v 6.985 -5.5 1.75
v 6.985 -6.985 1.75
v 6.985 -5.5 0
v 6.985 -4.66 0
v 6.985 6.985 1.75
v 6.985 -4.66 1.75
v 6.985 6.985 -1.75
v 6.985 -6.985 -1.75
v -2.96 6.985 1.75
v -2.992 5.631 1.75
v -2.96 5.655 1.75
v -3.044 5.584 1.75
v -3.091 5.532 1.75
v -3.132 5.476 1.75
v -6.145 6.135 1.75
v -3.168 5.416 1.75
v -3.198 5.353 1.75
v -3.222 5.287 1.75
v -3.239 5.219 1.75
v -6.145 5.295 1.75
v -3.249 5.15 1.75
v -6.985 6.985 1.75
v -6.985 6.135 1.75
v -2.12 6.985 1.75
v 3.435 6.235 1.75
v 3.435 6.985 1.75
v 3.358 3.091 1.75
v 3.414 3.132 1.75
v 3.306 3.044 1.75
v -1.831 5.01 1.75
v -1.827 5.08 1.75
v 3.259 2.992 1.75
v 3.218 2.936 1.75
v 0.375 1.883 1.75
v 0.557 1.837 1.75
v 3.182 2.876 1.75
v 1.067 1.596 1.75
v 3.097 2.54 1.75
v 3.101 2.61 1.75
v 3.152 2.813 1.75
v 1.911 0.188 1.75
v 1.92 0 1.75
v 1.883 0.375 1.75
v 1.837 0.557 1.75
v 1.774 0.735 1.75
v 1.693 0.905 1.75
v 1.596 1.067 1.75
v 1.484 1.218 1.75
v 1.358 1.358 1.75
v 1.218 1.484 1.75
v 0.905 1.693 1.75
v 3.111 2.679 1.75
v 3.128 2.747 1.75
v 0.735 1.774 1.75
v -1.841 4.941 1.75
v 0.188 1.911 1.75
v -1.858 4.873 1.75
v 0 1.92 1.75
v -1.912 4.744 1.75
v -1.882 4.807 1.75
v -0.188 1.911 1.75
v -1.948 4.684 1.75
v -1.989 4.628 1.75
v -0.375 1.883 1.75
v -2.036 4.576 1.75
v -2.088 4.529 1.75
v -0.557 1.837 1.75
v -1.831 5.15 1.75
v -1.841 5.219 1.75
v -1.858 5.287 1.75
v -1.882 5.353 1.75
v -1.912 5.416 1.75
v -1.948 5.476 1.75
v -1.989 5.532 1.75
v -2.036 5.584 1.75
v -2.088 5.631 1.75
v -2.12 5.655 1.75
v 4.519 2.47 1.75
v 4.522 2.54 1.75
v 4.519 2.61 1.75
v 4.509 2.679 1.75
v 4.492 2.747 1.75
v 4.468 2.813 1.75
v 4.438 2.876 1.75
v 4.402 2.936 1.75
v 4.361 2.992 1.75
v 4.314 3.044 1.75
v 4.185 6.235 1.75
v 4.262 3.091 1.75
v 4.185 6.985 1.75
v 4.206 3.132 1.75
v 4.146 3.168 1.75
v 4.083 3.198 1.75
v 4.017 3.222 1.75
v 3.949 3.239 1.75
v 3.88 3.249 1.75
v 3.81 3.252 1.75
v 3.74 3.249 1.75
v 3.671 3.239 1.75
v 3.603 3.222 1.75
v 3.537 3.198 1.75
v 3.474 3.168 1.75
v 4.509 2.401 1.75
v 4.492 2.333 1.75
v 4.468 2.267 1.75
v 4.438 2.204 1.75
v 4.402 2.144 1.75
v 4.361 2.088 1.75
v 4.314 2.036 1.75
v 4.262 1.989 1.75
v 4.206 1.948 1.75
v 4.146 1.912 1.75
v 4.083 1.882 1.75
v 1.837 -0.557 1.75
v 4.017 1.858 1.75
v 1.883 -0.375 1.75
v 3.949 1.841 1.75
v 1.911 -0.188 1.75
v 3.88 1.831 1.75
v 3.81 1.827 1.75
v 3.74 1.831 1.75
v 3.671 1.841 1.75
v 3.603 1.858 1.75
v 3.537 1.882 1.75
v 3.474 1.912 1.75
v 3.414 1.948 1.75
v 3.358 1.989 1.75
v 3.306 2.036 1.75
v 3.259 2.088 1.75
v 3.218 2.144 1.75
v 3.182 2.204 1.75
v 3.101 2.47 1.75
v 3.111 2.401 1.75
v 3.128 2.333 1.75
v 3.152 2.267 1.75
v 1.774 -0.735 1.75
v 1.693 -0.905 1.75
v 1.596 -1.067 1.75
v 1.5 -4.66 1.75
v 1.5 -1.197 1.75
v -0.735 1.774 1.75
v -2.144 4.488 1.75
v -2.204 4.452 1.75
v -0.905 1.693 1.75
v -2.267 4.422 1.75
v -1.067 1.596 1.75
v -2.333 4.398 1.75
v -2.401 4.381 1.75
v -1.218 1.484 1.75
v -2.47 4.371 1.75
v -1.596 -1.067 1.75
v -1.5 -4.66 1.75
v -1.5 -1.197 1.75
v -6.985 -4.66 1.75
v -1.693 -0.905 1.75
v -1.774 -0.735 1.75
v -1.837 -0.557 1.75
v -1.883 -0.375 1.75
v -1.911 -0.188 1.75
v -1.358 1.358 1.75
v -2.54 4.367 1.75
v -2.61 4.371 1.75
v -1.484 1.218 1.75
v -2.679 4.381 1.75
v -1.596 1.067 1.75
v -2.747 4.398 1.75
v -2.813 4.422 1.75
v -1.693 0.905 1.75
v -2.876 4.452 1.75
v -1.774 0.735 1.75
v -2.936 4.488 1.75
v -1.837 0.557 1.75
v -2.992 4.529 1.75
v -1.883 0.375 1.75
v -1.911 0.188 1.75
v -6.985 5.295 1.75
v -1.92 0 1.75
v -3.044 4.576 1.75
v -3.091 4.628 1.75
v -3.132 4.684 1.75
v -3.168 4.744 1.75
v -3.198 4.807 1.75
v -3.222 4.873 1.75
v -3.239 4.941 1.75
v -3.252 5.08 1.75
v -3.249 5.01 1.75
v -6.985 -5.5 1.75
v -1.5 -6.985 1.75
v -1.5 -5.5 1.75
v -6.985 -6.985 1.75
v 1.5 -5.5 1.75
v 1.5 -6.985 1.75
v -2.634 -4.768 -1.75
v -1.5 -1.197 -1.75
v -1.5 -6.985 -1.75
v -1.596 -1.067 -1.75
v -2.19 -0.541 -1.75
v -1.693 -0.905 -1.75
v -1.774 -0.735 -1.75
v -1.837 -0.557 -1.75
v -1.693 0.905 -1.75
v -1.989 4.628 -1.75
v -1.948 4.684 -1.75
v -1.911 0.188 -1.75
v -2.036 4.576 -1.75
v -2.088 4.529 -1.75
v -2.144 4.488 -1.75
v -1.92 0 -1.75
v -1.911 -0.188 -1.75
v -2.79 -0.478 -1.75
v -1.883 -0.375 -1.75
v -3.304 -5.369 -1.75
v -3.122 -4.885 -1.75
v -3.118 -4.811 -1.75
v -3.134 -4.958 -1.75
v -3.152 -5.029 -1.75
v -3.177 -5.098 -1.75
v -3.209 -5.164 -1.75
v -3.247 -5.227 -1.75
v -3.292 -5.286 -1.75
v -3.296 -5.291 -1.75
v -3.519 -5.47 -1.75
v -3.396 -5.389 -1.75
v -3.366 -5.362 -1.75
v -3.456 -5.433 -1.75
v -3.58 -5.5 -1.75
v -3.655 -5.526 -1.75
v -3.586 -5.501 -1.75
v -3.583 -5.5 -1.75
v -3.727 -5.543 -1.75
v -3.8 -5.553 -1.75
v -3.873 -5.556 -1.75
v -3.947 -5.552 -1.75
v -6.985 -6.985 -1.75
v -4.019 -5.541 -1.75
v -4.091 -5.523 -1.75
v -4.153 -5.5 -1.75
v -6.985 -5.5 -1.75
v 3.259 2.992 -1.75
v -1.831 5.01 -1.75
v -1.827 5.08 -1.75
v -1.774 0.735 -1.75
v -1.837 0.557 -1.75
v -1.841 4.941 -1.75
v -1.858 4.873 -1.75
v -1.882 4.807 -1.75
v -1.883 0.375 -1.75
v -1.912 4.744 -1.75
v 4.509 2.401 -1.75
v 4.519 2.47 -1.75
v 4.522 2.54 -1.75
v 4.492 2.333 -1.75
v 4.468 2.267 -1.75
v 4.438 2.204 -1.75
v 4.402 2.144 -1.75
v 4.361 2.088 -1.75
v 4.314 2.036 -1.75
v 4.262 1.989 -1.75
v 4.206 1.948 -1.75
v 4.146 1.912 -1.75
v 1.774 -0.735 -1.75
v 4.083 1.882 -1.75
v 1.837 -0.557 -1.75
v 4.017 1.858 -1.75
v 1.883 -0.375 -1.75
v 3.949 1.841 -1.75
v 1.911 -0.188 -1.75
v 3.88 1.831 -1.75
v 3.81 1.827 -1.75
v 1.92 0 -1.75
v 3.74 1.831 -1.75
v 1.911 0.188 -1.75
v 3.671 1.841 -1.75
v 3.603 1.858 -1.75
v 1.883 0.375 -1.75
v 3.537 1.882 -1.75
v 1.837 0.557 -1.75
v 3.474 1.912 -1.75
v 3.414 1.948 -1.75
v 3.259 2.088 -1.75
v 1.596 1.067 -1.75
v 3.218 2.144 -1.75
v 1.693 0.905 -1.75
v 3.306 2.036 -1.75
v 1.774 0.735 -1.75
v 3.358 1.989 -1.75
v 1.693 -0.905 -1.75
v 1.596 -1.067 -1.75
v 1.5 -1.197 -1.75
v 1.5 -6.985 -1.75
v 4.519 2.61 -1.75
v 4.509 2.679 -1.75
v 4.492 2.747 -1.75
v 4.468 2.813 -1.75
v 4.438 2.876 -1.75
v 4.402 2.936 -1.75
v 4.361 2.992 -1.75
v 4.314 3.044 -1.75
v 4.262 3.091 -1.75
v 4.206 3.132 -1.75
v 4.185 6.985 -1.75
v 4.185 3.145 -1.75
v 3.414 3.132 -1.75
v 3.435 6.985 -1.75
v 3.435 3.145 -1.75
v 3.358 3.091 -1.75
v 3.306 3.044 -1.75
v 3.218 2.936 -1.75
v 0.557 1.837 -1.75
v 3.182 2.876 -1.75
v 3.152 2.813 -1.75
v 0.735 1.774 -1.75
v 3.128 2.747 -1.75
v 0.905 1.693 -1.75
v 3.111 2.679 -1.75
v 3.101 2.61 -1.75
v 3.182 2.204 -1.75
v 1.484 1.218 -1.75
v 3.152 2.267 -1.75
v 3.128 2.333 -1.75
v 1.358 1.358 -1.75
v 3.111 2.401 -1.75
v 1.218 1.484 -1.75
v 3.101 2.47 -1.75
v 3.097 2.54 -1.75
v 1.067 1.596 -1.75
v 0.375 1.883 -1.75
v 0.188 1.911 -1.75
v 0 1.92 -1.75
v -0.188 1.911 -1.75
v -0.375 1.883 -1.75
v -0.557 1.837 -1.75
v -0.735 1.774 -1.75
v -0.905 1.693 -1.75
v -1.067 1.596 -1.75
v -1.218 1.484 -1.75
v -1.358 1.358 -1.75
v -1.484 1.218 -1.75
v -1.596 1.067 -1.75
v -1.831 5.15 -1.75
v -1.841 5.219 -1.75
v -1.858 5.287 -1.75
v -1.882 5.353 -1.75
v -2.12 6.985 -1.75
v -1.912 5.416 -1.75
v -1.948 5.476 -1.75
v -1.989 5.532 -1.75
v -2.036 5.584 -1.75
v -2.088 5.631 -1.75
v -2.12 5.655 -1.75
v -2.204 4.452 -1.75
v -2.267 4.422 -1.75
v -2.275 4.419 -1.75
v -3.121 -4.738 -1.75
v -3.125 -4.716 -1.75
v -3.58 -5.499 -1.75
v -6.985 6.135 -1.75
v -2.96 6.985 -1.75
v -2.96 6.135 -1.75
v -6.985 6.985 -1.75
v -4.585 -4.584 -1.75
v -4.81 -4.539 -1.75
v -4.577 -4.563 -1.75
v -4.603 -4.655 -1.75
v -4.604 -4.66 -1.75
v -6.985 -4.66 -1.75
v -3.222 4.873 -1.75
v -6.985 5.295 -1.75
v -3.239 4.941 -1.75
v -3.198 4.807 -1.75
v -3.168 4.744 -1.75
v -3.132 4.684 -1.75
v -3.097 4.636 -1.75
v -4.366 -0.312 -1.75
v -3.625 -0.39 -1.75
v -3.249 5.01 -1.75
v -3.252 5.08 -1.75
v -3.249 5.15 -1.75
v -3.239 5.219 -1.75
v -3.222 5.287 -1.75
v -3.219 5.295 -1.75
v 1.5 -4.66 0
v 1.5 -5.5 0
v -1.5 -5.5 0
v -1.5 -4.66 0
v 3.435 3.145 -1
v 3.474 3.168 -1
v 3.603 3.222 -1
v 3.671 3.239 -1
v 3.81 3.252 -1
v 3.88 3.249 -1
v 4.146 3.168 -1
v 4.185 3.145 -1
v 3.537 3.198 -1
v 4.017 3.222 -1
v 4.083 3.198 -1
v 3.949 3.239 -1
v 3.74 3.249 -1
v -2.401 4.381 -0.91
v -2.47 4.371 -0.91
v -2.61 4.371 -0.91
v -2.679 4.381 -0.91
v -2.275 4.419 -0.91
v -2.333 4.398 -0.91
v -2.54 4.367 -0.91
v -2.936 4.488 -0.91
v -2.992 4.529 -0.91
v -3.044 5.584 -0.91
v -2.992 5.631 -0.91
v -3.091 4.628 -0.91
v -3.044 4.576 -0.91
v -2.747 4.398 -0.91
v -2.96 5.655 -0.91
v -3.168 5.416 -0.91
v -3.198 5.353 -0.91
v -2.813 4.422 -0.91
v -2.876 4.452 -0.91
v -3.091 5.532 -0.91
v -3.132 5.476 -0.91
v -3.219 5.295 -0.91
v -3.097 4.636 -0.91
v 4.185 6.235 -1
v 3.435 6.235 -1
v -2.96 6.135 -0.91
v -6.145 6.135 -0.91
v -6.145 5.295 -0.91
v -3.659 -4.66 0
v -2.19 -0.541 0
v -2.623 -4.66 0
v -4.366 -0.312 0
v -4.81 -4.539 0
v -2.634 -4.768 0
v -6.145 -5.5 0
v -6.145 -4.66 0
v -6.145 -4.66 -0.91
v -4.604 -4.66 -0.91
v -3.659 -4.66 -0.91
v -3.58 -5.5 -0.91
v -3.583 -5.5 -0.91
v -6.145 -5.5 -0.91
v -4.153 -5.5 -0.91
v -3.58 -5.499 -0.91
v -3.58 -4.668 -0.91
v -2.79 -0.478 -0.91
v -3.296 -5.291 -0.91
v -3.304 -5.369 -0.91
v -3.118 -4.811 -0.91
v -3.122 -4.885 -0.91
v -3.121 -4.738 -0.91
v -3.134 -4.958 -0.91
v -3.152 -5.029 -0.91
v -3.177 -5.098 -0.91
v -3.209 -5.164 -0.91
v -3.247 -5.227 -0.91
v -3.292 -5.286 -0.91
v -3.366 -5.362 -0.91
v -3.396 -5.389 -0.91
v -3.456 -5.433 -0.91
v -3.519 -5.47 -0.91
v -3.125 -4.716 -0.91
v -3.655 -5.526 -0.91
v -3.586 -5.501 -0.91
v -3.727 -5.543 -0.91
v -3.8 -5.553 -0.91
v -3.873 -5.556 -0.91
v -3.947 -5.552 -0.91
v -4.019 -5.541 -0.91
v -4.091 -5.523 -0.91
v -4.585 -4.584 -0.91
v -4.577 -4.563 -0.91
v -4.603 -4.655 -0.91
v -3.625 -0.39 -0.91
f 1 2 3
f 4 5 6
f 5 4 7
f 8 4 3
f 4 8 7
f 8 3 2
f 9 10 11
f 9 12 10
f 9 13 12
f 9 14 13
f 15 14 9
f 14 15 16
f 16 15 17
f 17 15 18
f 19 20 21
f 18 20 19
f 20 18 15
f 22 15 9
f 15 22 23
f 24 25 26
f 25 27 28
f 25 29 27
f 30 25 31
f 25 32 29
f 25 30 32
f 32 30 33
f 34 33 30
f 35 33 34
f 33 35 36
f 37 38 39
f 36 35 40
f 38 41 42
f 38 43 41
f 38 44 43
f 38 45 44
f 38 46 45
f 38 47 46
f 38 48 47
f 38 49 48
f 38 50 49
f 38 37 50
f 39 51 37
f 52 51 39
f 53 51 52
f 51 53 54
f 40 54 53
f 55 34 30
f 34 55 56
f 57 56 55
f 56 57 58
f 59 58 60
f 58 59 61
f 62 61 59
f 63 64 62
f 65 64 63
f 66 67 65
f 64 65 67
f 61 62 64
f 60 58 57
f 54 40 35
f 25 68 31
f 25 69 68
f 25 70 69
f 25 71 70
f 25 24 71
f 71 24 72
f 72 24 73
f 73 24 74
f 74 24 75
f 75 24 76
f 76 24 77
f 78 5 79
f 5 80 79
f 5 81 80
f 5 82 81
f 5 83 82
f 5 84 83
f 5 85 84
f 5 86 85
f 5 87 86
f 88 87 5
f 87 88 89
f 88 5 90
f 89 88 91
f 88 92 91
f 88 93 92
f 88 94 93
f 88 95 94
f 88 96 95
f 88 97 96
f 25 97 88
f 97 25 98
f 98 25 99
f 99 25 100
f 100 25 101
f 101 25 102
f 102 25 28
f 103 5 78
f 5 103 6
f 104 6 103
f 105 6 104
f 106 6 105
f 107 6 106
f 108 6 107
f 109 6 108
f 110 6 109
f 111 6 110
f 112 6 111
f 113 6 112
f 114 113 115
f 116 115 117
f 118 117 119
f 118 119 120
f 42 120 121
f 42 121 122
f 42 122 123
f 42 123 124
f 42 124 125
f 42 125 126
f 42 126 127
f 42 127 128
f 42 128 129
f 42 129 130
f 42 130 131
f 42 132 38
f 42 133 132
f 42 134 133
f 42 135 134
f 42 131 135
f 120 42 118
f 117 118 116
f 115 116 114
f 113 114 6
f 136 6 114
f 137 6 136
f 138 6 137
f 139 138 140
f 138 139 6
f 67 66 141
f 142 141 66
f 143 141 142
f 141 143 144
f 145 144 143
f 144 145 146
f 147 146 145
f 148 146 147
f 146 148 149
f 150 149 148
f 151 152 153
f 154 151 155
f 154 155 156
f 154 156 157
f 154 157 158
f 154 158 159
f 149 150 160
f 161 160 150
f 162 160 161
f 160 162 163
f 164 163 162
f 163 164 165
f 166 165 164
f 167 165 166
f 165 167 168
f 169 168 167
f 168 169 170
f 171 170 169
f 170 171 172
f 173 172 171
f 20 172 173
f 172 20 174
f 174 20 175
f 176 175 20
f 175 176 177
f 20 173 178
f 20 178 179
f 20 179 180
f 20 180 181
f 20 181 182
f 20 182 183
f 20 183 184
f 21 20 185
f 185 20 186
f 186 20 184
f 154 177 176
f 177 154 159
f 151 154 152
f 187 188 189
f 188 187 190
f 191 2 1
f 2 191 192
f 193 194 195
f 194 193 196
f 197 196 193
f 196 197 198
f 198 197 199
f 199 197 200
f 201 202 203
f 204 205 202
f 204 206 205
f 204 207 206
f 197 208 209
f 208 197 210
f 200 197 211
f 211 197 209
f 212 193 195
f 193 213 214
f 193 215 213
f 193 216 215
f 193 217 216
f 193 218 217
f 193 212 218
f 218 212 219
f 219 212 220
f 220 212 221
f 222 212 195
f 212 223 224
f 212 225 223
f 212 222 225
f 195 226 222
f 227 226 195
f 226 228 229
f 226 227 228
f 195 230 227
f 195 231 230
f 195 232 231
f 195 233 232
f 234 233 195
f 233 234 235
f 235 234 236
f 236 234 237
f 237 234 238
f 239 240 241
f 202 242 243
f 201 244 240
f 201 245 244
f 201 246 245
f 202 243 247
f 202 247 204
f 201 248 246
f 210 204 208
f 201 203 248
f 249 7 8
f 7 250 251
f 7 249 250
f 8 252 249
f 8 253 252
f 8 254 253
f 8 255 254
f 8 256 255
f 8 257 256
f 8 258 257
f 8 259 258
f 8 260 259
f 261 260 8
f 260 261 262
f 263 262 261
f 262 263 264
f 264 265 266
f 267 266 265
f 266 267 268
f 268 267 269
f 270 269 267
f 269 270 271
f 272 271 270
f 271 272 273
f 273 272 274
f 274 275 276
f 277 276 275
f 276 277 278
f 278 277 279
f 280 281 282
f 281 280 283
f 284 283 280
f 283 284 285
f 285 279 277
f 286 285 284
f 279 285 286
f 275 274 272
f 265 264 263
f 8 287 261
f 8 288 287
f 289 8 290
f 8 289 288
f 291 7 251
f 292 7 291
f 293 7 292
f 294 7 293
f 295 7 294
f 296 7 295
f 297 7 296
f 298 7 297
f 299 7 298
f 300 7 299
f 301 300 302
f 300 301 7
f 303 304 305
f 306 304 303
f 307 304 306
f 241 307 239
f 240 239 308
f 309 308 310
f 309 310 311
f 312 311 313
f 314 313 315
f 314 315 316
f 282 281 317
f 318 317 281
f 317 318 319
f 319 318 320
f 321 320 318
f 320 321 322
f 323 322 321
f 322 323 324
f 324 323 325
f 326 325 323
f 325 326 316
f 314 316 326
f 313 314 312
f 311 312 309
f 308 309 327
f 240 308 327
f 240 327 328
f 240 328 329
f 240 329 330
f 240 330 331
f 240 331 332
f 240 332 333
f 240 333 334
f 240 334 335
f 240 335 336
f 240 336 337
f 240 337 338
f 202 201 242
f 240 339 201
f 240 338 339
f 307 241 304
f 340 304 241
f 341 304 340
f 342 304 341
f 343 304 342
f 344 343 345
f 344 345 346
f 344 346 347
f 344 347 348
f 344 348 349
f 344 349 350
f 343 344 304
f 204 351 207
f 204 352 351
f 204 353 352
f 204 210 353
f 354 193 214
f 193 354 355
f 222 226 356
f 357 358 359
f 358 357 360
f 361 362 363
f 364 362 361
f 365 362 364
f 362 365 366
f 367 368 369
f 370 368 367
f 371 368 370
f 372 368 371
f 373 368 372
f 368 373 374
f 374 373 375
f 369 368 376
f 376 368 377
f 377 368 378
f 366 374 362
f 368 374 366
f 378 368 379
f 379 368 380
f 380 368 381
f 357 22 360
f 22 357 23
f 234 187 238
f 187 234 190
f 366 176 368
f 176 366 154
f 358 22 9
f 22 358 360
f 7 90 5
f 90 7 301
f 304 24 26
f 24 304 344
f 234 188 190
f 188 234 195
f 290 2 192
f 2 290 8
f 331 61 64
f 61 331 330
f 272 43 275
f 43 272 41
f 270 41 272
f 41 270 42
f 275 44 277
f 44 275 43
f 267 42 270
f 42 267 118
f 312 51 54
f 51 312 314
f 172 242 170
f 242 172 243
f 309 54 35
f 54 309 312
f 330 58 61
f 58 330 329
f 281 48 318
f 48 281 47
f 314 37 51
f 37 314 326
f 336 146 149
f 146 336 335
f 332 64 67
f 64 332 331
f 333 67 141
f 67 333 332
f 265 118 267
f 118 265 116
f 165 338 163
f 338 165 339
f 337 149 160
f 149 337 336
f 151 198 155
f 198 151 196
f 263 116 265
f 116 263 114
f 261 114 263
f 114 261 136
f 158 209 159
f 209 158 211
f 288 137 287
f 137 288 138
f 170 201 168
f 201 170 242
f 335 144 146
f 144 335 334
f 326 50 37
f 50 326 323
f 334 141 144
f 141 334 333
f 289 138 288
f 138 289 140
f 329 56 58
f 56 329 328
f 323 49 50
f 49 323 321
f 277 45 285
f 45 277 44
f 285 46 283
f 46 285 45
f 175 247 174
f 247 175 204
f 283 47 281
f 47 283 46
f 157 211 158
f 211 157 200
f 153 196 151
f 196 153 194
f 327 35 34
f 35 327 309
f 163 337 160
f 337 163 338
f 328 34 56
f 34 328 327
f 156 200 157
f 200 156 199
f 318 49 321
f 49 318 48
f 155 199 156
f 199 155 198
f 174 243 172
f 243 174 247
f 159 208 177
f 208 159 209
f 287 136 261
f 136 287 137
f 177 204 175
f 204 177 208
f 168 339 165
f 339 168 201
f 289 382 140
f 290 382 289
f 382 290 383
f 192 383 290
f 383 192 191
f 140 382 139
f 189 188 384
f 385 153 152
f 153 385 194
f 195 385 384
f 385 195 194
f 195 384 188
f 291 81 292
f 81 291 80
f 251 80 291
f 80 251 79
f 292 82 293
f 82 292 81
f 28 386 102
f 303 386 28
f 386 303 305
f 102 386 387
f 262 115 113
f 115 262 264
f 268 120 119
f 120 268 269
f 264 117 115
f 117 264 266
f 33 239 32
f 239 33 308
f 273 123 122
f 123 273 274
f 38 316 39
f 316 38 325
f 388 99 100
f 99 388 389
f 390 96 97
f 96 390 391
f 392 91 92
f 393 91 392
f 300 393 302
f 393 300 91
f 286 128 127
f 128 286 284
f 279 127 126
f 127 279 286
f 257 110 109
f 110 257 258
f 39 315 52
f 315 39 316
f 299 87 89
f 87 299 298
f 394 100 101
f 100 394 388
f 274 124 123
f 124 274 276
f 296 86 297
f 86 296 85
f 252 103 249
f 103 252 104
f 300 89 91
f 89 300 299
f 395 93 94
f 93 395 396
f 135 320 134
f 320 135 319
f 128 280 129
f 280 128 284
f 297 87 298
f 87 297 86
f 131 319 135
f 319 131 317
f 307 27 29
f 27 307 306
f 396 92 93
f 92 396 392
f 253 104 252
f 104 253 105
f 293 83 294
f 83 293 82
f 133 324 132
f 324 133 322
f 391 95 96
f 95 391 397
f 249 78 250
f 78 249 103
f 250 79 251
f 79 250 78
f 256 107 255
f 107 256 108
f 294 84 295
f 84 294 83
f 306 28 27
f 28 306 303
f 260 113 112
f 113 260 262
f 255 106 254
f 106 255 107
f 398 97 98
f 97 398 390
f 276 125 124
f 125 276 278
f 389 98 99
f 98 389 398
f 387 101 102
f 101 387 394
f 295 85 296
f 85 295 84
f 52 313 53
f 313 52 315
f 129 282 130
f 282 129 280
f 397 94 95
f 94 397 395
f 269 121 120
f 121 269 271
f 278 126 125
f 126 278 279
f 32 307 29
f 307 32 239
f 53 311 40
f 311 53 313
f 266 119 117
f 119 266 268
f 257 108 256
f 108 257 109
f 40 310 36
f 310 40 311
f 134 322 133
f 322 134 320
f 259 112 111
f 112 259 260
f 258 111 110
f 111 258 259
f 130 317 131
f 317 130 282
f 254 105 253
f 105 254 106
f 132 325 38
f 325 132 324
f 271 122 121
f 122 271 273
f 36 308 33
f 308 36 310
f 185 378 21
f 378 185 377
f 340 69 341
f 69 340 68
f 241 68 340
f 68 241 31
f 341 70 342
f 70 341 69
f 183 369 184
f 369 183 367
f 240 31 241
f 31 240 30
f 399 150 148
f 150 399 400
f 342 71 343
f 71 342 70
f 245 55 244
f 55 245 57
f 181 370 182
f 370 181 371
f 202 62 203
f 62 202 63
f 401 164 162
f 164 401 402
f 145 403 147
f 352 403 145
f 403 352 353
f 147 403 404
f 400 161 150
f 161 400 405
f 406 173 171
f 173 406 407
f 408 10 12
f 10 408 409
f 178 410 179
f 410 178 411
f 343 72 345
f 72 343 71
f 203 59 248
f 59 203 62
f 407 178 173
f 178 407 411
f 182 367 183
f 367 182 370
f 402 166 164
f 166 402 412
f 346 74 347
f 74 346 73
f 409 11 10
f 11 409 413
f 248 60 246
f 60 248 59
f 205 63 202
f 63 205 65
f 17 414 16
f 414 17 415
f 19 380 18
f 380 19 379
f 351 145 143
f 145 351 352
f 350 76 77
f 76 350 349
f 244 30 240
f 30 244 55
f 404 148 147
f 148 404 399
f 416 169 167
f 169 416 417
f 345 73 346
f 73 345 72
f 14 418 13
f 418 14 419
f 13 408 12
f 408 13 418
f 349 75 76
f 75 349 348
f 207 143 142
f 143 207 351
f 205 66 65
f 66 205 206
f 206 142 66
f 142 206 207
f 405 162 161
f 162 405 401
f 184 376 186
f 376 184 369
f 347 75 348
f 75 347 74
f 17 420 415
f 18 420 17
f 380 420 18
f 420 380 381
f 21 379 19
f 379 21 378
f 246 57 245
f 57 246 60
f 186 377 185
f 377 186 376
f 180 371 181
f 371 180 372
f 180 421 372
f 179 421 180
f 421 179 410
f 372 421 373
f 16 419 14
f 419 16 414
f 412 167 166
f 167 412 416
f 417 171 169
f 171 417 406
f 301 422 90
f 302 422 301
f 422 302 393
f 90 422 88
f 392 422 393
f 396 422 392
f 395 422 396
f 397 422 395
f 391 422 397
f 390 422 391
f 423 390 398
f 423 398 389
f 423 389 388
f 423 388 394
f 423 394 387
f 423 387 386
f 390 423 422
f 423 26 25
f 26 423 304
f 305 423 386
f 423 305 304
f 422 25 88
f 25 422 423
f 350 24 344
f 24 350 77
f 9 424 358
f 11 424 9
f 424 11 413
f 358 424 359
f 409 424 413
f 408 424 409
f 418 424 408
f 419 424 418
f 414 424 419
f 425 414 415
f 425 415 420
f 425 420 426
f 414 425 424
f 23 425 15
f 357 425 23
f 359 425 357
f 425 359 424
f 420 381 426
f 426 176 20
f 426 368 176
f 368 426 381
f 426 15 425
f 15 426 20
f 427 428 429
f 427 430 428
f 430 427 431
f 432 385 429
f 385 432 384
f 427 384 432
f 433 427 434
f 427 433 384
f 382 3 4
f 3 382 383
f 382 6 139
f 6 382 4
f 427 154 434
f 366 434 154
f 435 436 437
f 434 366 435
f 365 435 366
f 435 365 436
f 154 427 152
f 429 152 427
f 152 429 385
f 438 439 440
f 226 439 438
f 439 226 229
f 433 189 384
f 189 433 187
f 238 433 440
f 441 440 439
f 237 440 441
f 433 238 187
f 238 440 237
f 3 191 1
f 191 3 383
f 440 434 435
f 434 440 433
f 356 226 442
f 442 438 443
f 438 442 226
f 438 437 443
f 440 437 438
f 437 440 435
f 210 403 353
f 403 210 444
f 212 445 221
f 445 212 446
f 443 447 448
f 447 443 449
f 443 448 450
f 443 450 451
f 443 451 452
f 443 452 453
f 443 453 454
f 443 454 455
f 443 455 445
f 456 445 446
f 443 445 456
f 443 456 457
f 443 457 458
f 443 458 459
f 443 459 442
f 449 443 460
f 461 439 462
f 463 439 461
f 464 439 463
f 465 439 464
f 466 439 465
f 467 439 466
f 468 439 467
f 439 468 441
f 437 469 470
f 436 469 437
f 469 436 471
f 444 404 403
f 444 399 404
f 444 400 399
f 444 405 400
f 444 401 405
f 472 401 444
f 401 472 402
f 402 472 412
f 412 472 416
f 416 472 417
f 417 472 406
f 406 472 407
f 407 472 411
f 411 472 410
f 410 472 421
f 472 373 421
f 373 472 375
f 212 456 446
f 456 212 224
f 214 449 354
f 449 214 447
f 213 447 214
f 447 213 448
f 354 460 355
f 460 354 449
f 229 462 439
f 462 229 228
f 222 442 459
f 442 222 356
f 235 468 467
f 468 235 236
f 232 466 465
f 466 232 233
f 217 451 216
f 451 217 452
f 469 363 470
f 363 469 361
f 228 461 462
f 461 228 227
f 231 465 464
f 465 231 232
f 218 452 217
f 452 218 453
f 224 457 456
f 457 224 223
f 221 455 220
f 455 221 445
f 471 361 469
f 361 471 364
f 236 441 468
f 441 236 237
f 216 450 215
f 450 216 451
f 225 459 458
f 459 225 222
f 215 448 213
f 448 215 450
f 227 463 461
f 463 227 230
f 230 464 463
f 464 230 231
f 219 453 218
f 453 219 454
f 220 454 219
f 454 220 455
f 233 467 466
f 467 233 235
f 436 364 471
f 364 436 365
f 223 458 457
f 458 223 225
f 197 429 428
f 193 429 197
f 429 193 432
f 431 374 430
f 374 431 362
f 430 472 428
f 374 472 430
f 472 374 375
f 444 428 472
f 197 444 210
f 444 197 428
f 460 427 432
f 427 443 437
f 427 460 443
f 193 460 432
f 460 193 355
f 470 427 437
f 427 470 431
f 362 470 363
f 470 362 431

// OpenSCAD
$fn = 64;

// Cherry MX
// https://cdn.sparkfun.com/datasheets/Components/Switches/MX%20Series.pdf

// Diode (1N4148)
// https://www.vishay.com/docs/81857/1n4148.pdf

grid = 1.27;

pin_dia = 1.5 * 0.95;
pin1 = [3*grid, 2*grid];
pin2 = [-2*grid, 4*grid];

stem = 4.0 * 0.96;

base = [11*grid, 11*grid, 3.5];

diode = [1.75 * 1.25, 3.4 * 1.25];
diode_dia = 0.56 * 1.5;
wire_dia = 0.5 * 1.5;

diode_angle = -6;

difference(){
    make_body();
    
    //pcb_mount_pegs();

    wire_slots();

    diode_slot();
}

module make_body(){
    difference(){
        cube([base.x, base.y, base.z], center = true);

        // Main Stem Clamp
        cylinder(h=base.z*2, d=stem, center = true);
        
        translate([0, -5, 0]){
            cube([3, 10, base.z*2], center = true);
        }

        // Switch Pins
        translate([pin1.x, pin1.y, 0]){
            cylinder(h=base.z*2, d=pin_dia, center = true);
        }
        
        translate([pin2.x, pin2.y, 0]){
            cylinder(h=base.z*2, d=pin_dia, center = true);
        }
    }
}

module pcb_mount_pegs() {
    peg1 = [-4*grid, 0, 2.1];
    peg2 = [4*grid, 0, 2.1];
 
    translate([peg1.x, peg1.y, 0]){
        cylinder(h=base.z*2, d=peg1[2], center = true);
    }

    translate([peg2.x, peg2.y, 0]){
        cylinder(h=base.z*2, d=peg2[2], center = true);
    }
}

module wire_slots(){
    translate([pin1.x, 4*grid, -base.z/2])
        cube([wire_dia, 4*grid, 2*wire_dia], center = true);
    translate([pin1.x, 5.5*grid, 0])
        cube([wire_dia, 2*wire_dia, base.z], center = true);
}

module diode_slot(){
    module top_lines() {
        translate([-2*grid, 5*grid, 0])
            cube([diode_dia, base.y/2-pin2.y, base.z*2], center = true);

        translate([-4*grid, 4.5*grid, -base.z/2])
            cube([5, diode_dia, 2*diode_dia], center = true);

        translate([(-base.x/2)+diode_dia/2, 4.5*grid, 0])
            cube([diode_dia, diode_dia, base.z*2], center = true);
    }
    
    module bottom_lines() {
        translate([0, -4*grid, base.z/2])
            cube([base.x, diode_dia, base.z], center = true);
        
        translate([(-base.x/2)+diode_dia/2, -4*grid, 0])
            cube([diode_dia, diode_dia, base.z*2], center = true);
        
        translate([-4*grid, -4*grid, -base.z/2])
            cube([3, diode_dia, 2*diode_dia], center = true);
    }
    
    // Diode Body
    translate([-1.6*diode.x, -2*grid, -diode.x/2])
        rotate([0, 0, diode_angle]){
            cube([diode.x, diode.y, diode.x], center = true);
        } 
    
    top_lines();
    bottom_lines();

    translate([-2.7*grid, -2*grid, -base.z/2])
        rotate([0, 0, diode_angle]){
            translate([0, 2.2, 0])
                cube([diode_dia, 10, diode_dia*2], center = true);
            translate([-0.2, -2.3, 0])
                cylinder(h=diode_dia*2, d=1.5, center = true);
        }
}
